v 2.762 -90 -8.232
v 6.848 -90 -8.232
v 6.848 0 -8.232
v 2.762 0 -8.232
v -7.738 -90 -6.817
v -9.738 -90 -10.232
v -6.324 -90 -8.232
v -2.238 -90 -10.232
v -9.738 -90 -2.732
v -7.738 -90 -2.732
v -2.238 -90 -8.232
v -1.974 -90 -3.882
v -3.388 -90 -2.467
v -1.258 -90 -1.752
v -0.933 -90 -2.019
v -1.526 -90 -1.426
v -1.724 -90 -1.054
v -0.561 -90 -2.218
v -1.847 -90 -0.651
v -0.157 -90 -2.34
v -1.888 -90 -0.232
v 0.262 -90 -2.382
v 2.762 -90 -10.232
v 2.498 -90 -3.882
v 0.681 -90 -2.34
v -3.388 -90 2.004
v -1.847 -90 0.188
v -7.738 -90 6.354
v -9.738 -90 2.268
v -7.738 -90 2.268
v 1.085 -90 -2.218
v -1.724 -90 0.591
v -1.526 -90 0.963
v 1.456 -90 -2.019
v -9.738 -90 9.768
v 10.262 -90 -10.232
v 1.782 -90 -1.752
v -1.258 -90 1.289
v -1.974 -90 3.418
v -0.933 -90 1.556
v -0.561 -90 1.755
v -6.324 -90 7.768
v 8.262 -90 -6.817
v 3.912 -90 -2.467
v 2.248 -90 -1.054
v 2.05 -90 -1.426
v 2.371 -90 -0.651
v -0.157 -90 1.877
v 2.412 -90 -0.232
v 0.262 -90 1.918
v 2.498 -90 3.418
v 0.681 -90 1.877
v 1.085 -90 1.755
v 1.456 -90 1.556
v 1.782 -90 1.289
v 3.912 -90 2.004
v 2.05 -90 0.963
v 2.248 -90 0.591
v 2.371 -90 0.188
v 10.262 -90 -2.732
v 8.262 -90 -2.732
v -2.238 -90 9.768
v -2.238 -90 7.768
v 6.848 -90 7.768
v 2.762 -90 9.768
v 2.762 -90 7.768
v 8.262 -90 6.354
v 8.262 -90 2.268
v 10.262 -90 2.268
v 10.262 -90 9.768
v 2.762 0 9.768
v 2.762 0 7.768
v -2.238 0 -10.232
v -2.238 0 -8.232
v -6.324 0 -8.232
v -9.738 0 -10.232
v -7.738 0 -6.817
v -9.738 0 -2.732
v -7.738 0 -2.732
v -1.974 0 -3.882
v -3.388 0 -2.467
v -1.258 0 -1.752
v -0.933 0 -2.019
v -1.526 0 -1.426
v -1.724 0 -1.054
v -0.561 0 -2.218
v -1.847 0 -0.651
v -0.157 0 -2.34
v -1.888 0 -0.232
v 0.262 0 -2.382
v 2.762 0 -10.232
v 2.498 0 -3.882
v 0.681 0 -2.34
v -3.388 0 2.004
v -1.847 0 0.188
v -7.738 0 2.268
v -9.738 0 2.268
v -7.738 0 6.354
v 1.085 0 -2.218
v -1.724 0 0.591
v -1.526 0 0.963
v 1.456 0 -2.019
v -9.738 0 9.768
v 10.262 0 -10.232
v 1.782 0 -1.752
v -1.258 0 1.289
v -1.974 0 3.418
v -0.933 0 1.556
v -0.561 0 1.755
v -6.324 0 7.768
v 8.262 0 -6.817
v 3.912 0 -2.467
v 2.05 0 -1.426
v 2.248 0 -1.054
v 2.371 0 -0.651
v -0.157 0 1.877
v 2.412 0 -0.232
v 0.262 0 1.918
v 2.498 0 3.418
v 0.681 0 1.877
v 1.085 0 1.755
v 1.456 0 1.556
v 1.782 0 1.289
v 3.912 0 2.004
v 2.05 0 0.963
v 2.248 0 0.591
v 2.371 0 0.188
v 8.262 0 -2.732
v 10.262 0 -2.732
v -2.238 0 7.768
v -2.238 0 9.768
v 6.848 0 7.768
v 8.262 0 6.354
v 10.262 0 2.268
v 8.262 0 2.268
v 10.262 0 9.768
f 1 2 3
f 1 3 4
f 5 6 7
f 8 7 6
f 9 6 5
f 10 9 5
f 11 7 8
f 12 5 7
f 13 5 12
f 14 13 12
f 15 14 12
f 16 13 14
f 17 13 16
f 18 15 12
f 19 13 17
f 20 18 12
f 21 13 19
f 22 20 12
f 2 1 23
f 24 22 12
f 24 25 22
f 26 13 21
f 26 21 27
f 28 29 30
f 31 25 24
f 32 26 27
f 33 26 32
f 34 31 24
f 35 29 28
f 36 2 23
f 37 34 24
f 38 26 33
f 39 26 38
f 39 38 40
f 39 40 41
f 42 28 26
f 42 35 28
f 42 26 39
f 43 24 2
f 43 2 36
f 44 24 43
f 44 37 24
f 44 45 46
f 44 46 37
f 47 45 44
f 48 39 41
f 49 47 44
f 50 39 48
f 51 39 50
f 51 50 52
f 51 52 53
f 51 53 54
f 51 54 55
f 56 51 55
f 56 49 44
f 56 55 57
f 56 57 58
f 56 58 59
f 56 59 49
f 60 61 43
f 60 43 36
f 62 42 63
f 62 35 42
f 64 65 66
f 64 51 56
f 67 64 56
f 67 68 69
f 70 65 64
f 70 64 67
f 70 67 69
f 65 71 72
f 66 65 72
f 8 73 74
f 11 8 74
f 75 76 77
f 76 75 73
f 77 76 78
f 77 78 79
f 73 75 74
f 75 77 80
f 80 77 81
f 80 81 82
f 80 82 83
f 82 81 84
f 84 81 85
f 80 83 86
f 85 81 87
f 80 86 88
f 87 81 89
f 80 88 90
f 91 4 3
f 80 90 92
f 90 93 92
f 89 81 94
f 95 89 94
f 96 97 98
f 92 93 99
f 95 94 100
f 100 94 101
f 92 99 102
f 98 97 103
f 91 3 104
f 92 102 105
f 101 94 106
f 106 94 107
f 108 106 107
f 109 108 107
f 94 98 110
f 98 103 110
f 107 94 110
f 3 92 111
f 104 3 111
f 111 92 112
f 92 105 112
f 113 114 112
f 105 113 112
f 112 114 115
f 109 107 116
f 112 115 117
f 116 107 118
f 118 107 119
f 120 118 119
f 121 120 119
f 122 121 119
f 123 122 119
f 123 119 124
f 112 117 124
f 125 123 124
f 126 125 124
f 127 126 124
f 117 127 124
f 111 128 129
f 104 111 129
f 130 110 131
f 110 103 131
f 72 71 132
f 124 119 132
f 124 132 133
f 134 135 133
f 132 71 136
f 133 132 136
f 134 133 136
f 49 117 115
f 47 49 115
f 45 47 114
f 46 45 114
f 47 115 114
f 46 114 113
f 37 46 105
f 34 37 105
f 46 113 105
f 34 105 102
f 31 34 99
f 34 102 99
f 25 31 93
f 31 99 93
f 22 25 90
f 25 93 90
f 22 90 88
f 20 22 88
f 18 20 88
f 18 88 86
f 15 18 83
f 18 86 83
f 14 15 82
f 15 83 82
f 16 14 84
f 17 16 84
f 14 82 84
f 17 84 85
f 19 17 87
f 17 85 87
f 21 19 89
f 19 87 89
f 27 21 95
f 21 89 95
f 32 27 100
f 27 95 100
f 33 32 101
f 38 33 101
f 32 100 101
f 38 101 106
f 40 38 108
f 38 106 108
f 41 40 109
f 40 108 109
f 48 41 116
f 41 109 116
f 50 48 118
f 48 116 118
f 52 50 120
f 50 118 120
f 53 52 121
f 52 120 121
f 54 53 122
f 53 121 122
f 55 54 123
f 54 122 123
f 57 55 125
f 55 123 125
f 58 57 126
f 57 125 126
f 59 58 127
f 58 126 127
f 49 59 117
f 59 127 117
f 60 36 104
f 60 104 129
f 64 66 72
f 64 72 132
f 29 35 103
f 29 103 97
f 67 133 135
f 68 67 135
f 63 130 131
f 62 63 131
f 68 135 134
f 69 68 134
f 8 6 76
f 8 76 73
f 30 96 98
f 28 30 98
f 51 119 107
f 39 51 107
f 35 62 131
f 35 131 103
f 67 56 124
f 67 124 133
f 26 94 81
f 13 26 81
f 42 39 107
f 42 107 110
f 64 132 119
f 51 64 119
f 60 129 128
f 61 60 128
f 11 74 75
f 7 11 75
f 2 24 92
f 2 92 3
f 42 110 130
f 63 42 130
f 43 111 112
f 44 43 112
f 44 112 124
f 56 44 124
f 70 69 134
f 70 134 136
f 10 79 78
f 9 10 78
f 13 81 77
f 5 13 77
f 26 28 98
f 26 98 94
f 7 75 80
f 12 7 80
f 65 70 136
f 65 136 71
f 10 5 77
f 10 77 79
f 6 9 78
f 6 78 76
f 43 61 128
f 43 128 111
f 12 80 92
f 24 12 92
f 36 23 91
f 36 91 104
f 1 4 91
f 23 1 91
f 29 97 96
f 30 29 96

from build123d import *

# Parameters (mm, degrees)
F1_DEPTH = 90


with BuildPart() as f1:
    # F0 (on Front) → F1 (new body)
    with BuildSketch(Plane.XZ):
        Polygon((-2.238045, 9.768403), (-9.738045, 9.768403), (-9.738045, 2.268403), (-7.738045, 2.268403), (-7.738045, 6.35419), (-3.388045, 2.00419), (-3.388045, -0.231597), (-3.388045, -2.467383), (-7.738045, -6.817383), (-7.738045, -2.731597), (-9.738045, -2.731597), (-9.738045, -10.231597), (-2.238045, -10.231597), (-2.238045, -8.231597), (-6.323832, -8.231597), (-1.973832, -3.881597), (2.497741, -3.881597), (6.847741, -8.231597), (2.761955, -8.231597), (2.761955, -10.231597), (10.261955, -10.231597), (10.261955, -2.731597), (8.261955, -2.731597), (8.261955, -6.817383), (3.911955, -2.467383), (3.911955, -0.231597), (3.911955, 2.00419), (8.261955, 6.35419), (8.261955, 2.268403), (10.261955, 2.268403), (10.261955, 9.768403), (2.761955, 9.768403), (2.761955, 7.768403), (6.847741, 7.768403), (2.497741, 3.418403), (-1.973832, 3.418403), (-6.323832, 7.768403), (-2.238045, 7.768403), align=None)
        with BuildLine():
            ThreePointArc((-1.888045, -0.231597), (0.261955, 1.918403), (2.411955, -0.231597))
            ThreePointArc((2.411955, -0.231597), (0.261955, -2.381597), (-1.888045, -0.231597))
        make_face(mode=Mode.SUBTRACT)
    extrude(amount=F1_DEPTH)


solid = f1.part
